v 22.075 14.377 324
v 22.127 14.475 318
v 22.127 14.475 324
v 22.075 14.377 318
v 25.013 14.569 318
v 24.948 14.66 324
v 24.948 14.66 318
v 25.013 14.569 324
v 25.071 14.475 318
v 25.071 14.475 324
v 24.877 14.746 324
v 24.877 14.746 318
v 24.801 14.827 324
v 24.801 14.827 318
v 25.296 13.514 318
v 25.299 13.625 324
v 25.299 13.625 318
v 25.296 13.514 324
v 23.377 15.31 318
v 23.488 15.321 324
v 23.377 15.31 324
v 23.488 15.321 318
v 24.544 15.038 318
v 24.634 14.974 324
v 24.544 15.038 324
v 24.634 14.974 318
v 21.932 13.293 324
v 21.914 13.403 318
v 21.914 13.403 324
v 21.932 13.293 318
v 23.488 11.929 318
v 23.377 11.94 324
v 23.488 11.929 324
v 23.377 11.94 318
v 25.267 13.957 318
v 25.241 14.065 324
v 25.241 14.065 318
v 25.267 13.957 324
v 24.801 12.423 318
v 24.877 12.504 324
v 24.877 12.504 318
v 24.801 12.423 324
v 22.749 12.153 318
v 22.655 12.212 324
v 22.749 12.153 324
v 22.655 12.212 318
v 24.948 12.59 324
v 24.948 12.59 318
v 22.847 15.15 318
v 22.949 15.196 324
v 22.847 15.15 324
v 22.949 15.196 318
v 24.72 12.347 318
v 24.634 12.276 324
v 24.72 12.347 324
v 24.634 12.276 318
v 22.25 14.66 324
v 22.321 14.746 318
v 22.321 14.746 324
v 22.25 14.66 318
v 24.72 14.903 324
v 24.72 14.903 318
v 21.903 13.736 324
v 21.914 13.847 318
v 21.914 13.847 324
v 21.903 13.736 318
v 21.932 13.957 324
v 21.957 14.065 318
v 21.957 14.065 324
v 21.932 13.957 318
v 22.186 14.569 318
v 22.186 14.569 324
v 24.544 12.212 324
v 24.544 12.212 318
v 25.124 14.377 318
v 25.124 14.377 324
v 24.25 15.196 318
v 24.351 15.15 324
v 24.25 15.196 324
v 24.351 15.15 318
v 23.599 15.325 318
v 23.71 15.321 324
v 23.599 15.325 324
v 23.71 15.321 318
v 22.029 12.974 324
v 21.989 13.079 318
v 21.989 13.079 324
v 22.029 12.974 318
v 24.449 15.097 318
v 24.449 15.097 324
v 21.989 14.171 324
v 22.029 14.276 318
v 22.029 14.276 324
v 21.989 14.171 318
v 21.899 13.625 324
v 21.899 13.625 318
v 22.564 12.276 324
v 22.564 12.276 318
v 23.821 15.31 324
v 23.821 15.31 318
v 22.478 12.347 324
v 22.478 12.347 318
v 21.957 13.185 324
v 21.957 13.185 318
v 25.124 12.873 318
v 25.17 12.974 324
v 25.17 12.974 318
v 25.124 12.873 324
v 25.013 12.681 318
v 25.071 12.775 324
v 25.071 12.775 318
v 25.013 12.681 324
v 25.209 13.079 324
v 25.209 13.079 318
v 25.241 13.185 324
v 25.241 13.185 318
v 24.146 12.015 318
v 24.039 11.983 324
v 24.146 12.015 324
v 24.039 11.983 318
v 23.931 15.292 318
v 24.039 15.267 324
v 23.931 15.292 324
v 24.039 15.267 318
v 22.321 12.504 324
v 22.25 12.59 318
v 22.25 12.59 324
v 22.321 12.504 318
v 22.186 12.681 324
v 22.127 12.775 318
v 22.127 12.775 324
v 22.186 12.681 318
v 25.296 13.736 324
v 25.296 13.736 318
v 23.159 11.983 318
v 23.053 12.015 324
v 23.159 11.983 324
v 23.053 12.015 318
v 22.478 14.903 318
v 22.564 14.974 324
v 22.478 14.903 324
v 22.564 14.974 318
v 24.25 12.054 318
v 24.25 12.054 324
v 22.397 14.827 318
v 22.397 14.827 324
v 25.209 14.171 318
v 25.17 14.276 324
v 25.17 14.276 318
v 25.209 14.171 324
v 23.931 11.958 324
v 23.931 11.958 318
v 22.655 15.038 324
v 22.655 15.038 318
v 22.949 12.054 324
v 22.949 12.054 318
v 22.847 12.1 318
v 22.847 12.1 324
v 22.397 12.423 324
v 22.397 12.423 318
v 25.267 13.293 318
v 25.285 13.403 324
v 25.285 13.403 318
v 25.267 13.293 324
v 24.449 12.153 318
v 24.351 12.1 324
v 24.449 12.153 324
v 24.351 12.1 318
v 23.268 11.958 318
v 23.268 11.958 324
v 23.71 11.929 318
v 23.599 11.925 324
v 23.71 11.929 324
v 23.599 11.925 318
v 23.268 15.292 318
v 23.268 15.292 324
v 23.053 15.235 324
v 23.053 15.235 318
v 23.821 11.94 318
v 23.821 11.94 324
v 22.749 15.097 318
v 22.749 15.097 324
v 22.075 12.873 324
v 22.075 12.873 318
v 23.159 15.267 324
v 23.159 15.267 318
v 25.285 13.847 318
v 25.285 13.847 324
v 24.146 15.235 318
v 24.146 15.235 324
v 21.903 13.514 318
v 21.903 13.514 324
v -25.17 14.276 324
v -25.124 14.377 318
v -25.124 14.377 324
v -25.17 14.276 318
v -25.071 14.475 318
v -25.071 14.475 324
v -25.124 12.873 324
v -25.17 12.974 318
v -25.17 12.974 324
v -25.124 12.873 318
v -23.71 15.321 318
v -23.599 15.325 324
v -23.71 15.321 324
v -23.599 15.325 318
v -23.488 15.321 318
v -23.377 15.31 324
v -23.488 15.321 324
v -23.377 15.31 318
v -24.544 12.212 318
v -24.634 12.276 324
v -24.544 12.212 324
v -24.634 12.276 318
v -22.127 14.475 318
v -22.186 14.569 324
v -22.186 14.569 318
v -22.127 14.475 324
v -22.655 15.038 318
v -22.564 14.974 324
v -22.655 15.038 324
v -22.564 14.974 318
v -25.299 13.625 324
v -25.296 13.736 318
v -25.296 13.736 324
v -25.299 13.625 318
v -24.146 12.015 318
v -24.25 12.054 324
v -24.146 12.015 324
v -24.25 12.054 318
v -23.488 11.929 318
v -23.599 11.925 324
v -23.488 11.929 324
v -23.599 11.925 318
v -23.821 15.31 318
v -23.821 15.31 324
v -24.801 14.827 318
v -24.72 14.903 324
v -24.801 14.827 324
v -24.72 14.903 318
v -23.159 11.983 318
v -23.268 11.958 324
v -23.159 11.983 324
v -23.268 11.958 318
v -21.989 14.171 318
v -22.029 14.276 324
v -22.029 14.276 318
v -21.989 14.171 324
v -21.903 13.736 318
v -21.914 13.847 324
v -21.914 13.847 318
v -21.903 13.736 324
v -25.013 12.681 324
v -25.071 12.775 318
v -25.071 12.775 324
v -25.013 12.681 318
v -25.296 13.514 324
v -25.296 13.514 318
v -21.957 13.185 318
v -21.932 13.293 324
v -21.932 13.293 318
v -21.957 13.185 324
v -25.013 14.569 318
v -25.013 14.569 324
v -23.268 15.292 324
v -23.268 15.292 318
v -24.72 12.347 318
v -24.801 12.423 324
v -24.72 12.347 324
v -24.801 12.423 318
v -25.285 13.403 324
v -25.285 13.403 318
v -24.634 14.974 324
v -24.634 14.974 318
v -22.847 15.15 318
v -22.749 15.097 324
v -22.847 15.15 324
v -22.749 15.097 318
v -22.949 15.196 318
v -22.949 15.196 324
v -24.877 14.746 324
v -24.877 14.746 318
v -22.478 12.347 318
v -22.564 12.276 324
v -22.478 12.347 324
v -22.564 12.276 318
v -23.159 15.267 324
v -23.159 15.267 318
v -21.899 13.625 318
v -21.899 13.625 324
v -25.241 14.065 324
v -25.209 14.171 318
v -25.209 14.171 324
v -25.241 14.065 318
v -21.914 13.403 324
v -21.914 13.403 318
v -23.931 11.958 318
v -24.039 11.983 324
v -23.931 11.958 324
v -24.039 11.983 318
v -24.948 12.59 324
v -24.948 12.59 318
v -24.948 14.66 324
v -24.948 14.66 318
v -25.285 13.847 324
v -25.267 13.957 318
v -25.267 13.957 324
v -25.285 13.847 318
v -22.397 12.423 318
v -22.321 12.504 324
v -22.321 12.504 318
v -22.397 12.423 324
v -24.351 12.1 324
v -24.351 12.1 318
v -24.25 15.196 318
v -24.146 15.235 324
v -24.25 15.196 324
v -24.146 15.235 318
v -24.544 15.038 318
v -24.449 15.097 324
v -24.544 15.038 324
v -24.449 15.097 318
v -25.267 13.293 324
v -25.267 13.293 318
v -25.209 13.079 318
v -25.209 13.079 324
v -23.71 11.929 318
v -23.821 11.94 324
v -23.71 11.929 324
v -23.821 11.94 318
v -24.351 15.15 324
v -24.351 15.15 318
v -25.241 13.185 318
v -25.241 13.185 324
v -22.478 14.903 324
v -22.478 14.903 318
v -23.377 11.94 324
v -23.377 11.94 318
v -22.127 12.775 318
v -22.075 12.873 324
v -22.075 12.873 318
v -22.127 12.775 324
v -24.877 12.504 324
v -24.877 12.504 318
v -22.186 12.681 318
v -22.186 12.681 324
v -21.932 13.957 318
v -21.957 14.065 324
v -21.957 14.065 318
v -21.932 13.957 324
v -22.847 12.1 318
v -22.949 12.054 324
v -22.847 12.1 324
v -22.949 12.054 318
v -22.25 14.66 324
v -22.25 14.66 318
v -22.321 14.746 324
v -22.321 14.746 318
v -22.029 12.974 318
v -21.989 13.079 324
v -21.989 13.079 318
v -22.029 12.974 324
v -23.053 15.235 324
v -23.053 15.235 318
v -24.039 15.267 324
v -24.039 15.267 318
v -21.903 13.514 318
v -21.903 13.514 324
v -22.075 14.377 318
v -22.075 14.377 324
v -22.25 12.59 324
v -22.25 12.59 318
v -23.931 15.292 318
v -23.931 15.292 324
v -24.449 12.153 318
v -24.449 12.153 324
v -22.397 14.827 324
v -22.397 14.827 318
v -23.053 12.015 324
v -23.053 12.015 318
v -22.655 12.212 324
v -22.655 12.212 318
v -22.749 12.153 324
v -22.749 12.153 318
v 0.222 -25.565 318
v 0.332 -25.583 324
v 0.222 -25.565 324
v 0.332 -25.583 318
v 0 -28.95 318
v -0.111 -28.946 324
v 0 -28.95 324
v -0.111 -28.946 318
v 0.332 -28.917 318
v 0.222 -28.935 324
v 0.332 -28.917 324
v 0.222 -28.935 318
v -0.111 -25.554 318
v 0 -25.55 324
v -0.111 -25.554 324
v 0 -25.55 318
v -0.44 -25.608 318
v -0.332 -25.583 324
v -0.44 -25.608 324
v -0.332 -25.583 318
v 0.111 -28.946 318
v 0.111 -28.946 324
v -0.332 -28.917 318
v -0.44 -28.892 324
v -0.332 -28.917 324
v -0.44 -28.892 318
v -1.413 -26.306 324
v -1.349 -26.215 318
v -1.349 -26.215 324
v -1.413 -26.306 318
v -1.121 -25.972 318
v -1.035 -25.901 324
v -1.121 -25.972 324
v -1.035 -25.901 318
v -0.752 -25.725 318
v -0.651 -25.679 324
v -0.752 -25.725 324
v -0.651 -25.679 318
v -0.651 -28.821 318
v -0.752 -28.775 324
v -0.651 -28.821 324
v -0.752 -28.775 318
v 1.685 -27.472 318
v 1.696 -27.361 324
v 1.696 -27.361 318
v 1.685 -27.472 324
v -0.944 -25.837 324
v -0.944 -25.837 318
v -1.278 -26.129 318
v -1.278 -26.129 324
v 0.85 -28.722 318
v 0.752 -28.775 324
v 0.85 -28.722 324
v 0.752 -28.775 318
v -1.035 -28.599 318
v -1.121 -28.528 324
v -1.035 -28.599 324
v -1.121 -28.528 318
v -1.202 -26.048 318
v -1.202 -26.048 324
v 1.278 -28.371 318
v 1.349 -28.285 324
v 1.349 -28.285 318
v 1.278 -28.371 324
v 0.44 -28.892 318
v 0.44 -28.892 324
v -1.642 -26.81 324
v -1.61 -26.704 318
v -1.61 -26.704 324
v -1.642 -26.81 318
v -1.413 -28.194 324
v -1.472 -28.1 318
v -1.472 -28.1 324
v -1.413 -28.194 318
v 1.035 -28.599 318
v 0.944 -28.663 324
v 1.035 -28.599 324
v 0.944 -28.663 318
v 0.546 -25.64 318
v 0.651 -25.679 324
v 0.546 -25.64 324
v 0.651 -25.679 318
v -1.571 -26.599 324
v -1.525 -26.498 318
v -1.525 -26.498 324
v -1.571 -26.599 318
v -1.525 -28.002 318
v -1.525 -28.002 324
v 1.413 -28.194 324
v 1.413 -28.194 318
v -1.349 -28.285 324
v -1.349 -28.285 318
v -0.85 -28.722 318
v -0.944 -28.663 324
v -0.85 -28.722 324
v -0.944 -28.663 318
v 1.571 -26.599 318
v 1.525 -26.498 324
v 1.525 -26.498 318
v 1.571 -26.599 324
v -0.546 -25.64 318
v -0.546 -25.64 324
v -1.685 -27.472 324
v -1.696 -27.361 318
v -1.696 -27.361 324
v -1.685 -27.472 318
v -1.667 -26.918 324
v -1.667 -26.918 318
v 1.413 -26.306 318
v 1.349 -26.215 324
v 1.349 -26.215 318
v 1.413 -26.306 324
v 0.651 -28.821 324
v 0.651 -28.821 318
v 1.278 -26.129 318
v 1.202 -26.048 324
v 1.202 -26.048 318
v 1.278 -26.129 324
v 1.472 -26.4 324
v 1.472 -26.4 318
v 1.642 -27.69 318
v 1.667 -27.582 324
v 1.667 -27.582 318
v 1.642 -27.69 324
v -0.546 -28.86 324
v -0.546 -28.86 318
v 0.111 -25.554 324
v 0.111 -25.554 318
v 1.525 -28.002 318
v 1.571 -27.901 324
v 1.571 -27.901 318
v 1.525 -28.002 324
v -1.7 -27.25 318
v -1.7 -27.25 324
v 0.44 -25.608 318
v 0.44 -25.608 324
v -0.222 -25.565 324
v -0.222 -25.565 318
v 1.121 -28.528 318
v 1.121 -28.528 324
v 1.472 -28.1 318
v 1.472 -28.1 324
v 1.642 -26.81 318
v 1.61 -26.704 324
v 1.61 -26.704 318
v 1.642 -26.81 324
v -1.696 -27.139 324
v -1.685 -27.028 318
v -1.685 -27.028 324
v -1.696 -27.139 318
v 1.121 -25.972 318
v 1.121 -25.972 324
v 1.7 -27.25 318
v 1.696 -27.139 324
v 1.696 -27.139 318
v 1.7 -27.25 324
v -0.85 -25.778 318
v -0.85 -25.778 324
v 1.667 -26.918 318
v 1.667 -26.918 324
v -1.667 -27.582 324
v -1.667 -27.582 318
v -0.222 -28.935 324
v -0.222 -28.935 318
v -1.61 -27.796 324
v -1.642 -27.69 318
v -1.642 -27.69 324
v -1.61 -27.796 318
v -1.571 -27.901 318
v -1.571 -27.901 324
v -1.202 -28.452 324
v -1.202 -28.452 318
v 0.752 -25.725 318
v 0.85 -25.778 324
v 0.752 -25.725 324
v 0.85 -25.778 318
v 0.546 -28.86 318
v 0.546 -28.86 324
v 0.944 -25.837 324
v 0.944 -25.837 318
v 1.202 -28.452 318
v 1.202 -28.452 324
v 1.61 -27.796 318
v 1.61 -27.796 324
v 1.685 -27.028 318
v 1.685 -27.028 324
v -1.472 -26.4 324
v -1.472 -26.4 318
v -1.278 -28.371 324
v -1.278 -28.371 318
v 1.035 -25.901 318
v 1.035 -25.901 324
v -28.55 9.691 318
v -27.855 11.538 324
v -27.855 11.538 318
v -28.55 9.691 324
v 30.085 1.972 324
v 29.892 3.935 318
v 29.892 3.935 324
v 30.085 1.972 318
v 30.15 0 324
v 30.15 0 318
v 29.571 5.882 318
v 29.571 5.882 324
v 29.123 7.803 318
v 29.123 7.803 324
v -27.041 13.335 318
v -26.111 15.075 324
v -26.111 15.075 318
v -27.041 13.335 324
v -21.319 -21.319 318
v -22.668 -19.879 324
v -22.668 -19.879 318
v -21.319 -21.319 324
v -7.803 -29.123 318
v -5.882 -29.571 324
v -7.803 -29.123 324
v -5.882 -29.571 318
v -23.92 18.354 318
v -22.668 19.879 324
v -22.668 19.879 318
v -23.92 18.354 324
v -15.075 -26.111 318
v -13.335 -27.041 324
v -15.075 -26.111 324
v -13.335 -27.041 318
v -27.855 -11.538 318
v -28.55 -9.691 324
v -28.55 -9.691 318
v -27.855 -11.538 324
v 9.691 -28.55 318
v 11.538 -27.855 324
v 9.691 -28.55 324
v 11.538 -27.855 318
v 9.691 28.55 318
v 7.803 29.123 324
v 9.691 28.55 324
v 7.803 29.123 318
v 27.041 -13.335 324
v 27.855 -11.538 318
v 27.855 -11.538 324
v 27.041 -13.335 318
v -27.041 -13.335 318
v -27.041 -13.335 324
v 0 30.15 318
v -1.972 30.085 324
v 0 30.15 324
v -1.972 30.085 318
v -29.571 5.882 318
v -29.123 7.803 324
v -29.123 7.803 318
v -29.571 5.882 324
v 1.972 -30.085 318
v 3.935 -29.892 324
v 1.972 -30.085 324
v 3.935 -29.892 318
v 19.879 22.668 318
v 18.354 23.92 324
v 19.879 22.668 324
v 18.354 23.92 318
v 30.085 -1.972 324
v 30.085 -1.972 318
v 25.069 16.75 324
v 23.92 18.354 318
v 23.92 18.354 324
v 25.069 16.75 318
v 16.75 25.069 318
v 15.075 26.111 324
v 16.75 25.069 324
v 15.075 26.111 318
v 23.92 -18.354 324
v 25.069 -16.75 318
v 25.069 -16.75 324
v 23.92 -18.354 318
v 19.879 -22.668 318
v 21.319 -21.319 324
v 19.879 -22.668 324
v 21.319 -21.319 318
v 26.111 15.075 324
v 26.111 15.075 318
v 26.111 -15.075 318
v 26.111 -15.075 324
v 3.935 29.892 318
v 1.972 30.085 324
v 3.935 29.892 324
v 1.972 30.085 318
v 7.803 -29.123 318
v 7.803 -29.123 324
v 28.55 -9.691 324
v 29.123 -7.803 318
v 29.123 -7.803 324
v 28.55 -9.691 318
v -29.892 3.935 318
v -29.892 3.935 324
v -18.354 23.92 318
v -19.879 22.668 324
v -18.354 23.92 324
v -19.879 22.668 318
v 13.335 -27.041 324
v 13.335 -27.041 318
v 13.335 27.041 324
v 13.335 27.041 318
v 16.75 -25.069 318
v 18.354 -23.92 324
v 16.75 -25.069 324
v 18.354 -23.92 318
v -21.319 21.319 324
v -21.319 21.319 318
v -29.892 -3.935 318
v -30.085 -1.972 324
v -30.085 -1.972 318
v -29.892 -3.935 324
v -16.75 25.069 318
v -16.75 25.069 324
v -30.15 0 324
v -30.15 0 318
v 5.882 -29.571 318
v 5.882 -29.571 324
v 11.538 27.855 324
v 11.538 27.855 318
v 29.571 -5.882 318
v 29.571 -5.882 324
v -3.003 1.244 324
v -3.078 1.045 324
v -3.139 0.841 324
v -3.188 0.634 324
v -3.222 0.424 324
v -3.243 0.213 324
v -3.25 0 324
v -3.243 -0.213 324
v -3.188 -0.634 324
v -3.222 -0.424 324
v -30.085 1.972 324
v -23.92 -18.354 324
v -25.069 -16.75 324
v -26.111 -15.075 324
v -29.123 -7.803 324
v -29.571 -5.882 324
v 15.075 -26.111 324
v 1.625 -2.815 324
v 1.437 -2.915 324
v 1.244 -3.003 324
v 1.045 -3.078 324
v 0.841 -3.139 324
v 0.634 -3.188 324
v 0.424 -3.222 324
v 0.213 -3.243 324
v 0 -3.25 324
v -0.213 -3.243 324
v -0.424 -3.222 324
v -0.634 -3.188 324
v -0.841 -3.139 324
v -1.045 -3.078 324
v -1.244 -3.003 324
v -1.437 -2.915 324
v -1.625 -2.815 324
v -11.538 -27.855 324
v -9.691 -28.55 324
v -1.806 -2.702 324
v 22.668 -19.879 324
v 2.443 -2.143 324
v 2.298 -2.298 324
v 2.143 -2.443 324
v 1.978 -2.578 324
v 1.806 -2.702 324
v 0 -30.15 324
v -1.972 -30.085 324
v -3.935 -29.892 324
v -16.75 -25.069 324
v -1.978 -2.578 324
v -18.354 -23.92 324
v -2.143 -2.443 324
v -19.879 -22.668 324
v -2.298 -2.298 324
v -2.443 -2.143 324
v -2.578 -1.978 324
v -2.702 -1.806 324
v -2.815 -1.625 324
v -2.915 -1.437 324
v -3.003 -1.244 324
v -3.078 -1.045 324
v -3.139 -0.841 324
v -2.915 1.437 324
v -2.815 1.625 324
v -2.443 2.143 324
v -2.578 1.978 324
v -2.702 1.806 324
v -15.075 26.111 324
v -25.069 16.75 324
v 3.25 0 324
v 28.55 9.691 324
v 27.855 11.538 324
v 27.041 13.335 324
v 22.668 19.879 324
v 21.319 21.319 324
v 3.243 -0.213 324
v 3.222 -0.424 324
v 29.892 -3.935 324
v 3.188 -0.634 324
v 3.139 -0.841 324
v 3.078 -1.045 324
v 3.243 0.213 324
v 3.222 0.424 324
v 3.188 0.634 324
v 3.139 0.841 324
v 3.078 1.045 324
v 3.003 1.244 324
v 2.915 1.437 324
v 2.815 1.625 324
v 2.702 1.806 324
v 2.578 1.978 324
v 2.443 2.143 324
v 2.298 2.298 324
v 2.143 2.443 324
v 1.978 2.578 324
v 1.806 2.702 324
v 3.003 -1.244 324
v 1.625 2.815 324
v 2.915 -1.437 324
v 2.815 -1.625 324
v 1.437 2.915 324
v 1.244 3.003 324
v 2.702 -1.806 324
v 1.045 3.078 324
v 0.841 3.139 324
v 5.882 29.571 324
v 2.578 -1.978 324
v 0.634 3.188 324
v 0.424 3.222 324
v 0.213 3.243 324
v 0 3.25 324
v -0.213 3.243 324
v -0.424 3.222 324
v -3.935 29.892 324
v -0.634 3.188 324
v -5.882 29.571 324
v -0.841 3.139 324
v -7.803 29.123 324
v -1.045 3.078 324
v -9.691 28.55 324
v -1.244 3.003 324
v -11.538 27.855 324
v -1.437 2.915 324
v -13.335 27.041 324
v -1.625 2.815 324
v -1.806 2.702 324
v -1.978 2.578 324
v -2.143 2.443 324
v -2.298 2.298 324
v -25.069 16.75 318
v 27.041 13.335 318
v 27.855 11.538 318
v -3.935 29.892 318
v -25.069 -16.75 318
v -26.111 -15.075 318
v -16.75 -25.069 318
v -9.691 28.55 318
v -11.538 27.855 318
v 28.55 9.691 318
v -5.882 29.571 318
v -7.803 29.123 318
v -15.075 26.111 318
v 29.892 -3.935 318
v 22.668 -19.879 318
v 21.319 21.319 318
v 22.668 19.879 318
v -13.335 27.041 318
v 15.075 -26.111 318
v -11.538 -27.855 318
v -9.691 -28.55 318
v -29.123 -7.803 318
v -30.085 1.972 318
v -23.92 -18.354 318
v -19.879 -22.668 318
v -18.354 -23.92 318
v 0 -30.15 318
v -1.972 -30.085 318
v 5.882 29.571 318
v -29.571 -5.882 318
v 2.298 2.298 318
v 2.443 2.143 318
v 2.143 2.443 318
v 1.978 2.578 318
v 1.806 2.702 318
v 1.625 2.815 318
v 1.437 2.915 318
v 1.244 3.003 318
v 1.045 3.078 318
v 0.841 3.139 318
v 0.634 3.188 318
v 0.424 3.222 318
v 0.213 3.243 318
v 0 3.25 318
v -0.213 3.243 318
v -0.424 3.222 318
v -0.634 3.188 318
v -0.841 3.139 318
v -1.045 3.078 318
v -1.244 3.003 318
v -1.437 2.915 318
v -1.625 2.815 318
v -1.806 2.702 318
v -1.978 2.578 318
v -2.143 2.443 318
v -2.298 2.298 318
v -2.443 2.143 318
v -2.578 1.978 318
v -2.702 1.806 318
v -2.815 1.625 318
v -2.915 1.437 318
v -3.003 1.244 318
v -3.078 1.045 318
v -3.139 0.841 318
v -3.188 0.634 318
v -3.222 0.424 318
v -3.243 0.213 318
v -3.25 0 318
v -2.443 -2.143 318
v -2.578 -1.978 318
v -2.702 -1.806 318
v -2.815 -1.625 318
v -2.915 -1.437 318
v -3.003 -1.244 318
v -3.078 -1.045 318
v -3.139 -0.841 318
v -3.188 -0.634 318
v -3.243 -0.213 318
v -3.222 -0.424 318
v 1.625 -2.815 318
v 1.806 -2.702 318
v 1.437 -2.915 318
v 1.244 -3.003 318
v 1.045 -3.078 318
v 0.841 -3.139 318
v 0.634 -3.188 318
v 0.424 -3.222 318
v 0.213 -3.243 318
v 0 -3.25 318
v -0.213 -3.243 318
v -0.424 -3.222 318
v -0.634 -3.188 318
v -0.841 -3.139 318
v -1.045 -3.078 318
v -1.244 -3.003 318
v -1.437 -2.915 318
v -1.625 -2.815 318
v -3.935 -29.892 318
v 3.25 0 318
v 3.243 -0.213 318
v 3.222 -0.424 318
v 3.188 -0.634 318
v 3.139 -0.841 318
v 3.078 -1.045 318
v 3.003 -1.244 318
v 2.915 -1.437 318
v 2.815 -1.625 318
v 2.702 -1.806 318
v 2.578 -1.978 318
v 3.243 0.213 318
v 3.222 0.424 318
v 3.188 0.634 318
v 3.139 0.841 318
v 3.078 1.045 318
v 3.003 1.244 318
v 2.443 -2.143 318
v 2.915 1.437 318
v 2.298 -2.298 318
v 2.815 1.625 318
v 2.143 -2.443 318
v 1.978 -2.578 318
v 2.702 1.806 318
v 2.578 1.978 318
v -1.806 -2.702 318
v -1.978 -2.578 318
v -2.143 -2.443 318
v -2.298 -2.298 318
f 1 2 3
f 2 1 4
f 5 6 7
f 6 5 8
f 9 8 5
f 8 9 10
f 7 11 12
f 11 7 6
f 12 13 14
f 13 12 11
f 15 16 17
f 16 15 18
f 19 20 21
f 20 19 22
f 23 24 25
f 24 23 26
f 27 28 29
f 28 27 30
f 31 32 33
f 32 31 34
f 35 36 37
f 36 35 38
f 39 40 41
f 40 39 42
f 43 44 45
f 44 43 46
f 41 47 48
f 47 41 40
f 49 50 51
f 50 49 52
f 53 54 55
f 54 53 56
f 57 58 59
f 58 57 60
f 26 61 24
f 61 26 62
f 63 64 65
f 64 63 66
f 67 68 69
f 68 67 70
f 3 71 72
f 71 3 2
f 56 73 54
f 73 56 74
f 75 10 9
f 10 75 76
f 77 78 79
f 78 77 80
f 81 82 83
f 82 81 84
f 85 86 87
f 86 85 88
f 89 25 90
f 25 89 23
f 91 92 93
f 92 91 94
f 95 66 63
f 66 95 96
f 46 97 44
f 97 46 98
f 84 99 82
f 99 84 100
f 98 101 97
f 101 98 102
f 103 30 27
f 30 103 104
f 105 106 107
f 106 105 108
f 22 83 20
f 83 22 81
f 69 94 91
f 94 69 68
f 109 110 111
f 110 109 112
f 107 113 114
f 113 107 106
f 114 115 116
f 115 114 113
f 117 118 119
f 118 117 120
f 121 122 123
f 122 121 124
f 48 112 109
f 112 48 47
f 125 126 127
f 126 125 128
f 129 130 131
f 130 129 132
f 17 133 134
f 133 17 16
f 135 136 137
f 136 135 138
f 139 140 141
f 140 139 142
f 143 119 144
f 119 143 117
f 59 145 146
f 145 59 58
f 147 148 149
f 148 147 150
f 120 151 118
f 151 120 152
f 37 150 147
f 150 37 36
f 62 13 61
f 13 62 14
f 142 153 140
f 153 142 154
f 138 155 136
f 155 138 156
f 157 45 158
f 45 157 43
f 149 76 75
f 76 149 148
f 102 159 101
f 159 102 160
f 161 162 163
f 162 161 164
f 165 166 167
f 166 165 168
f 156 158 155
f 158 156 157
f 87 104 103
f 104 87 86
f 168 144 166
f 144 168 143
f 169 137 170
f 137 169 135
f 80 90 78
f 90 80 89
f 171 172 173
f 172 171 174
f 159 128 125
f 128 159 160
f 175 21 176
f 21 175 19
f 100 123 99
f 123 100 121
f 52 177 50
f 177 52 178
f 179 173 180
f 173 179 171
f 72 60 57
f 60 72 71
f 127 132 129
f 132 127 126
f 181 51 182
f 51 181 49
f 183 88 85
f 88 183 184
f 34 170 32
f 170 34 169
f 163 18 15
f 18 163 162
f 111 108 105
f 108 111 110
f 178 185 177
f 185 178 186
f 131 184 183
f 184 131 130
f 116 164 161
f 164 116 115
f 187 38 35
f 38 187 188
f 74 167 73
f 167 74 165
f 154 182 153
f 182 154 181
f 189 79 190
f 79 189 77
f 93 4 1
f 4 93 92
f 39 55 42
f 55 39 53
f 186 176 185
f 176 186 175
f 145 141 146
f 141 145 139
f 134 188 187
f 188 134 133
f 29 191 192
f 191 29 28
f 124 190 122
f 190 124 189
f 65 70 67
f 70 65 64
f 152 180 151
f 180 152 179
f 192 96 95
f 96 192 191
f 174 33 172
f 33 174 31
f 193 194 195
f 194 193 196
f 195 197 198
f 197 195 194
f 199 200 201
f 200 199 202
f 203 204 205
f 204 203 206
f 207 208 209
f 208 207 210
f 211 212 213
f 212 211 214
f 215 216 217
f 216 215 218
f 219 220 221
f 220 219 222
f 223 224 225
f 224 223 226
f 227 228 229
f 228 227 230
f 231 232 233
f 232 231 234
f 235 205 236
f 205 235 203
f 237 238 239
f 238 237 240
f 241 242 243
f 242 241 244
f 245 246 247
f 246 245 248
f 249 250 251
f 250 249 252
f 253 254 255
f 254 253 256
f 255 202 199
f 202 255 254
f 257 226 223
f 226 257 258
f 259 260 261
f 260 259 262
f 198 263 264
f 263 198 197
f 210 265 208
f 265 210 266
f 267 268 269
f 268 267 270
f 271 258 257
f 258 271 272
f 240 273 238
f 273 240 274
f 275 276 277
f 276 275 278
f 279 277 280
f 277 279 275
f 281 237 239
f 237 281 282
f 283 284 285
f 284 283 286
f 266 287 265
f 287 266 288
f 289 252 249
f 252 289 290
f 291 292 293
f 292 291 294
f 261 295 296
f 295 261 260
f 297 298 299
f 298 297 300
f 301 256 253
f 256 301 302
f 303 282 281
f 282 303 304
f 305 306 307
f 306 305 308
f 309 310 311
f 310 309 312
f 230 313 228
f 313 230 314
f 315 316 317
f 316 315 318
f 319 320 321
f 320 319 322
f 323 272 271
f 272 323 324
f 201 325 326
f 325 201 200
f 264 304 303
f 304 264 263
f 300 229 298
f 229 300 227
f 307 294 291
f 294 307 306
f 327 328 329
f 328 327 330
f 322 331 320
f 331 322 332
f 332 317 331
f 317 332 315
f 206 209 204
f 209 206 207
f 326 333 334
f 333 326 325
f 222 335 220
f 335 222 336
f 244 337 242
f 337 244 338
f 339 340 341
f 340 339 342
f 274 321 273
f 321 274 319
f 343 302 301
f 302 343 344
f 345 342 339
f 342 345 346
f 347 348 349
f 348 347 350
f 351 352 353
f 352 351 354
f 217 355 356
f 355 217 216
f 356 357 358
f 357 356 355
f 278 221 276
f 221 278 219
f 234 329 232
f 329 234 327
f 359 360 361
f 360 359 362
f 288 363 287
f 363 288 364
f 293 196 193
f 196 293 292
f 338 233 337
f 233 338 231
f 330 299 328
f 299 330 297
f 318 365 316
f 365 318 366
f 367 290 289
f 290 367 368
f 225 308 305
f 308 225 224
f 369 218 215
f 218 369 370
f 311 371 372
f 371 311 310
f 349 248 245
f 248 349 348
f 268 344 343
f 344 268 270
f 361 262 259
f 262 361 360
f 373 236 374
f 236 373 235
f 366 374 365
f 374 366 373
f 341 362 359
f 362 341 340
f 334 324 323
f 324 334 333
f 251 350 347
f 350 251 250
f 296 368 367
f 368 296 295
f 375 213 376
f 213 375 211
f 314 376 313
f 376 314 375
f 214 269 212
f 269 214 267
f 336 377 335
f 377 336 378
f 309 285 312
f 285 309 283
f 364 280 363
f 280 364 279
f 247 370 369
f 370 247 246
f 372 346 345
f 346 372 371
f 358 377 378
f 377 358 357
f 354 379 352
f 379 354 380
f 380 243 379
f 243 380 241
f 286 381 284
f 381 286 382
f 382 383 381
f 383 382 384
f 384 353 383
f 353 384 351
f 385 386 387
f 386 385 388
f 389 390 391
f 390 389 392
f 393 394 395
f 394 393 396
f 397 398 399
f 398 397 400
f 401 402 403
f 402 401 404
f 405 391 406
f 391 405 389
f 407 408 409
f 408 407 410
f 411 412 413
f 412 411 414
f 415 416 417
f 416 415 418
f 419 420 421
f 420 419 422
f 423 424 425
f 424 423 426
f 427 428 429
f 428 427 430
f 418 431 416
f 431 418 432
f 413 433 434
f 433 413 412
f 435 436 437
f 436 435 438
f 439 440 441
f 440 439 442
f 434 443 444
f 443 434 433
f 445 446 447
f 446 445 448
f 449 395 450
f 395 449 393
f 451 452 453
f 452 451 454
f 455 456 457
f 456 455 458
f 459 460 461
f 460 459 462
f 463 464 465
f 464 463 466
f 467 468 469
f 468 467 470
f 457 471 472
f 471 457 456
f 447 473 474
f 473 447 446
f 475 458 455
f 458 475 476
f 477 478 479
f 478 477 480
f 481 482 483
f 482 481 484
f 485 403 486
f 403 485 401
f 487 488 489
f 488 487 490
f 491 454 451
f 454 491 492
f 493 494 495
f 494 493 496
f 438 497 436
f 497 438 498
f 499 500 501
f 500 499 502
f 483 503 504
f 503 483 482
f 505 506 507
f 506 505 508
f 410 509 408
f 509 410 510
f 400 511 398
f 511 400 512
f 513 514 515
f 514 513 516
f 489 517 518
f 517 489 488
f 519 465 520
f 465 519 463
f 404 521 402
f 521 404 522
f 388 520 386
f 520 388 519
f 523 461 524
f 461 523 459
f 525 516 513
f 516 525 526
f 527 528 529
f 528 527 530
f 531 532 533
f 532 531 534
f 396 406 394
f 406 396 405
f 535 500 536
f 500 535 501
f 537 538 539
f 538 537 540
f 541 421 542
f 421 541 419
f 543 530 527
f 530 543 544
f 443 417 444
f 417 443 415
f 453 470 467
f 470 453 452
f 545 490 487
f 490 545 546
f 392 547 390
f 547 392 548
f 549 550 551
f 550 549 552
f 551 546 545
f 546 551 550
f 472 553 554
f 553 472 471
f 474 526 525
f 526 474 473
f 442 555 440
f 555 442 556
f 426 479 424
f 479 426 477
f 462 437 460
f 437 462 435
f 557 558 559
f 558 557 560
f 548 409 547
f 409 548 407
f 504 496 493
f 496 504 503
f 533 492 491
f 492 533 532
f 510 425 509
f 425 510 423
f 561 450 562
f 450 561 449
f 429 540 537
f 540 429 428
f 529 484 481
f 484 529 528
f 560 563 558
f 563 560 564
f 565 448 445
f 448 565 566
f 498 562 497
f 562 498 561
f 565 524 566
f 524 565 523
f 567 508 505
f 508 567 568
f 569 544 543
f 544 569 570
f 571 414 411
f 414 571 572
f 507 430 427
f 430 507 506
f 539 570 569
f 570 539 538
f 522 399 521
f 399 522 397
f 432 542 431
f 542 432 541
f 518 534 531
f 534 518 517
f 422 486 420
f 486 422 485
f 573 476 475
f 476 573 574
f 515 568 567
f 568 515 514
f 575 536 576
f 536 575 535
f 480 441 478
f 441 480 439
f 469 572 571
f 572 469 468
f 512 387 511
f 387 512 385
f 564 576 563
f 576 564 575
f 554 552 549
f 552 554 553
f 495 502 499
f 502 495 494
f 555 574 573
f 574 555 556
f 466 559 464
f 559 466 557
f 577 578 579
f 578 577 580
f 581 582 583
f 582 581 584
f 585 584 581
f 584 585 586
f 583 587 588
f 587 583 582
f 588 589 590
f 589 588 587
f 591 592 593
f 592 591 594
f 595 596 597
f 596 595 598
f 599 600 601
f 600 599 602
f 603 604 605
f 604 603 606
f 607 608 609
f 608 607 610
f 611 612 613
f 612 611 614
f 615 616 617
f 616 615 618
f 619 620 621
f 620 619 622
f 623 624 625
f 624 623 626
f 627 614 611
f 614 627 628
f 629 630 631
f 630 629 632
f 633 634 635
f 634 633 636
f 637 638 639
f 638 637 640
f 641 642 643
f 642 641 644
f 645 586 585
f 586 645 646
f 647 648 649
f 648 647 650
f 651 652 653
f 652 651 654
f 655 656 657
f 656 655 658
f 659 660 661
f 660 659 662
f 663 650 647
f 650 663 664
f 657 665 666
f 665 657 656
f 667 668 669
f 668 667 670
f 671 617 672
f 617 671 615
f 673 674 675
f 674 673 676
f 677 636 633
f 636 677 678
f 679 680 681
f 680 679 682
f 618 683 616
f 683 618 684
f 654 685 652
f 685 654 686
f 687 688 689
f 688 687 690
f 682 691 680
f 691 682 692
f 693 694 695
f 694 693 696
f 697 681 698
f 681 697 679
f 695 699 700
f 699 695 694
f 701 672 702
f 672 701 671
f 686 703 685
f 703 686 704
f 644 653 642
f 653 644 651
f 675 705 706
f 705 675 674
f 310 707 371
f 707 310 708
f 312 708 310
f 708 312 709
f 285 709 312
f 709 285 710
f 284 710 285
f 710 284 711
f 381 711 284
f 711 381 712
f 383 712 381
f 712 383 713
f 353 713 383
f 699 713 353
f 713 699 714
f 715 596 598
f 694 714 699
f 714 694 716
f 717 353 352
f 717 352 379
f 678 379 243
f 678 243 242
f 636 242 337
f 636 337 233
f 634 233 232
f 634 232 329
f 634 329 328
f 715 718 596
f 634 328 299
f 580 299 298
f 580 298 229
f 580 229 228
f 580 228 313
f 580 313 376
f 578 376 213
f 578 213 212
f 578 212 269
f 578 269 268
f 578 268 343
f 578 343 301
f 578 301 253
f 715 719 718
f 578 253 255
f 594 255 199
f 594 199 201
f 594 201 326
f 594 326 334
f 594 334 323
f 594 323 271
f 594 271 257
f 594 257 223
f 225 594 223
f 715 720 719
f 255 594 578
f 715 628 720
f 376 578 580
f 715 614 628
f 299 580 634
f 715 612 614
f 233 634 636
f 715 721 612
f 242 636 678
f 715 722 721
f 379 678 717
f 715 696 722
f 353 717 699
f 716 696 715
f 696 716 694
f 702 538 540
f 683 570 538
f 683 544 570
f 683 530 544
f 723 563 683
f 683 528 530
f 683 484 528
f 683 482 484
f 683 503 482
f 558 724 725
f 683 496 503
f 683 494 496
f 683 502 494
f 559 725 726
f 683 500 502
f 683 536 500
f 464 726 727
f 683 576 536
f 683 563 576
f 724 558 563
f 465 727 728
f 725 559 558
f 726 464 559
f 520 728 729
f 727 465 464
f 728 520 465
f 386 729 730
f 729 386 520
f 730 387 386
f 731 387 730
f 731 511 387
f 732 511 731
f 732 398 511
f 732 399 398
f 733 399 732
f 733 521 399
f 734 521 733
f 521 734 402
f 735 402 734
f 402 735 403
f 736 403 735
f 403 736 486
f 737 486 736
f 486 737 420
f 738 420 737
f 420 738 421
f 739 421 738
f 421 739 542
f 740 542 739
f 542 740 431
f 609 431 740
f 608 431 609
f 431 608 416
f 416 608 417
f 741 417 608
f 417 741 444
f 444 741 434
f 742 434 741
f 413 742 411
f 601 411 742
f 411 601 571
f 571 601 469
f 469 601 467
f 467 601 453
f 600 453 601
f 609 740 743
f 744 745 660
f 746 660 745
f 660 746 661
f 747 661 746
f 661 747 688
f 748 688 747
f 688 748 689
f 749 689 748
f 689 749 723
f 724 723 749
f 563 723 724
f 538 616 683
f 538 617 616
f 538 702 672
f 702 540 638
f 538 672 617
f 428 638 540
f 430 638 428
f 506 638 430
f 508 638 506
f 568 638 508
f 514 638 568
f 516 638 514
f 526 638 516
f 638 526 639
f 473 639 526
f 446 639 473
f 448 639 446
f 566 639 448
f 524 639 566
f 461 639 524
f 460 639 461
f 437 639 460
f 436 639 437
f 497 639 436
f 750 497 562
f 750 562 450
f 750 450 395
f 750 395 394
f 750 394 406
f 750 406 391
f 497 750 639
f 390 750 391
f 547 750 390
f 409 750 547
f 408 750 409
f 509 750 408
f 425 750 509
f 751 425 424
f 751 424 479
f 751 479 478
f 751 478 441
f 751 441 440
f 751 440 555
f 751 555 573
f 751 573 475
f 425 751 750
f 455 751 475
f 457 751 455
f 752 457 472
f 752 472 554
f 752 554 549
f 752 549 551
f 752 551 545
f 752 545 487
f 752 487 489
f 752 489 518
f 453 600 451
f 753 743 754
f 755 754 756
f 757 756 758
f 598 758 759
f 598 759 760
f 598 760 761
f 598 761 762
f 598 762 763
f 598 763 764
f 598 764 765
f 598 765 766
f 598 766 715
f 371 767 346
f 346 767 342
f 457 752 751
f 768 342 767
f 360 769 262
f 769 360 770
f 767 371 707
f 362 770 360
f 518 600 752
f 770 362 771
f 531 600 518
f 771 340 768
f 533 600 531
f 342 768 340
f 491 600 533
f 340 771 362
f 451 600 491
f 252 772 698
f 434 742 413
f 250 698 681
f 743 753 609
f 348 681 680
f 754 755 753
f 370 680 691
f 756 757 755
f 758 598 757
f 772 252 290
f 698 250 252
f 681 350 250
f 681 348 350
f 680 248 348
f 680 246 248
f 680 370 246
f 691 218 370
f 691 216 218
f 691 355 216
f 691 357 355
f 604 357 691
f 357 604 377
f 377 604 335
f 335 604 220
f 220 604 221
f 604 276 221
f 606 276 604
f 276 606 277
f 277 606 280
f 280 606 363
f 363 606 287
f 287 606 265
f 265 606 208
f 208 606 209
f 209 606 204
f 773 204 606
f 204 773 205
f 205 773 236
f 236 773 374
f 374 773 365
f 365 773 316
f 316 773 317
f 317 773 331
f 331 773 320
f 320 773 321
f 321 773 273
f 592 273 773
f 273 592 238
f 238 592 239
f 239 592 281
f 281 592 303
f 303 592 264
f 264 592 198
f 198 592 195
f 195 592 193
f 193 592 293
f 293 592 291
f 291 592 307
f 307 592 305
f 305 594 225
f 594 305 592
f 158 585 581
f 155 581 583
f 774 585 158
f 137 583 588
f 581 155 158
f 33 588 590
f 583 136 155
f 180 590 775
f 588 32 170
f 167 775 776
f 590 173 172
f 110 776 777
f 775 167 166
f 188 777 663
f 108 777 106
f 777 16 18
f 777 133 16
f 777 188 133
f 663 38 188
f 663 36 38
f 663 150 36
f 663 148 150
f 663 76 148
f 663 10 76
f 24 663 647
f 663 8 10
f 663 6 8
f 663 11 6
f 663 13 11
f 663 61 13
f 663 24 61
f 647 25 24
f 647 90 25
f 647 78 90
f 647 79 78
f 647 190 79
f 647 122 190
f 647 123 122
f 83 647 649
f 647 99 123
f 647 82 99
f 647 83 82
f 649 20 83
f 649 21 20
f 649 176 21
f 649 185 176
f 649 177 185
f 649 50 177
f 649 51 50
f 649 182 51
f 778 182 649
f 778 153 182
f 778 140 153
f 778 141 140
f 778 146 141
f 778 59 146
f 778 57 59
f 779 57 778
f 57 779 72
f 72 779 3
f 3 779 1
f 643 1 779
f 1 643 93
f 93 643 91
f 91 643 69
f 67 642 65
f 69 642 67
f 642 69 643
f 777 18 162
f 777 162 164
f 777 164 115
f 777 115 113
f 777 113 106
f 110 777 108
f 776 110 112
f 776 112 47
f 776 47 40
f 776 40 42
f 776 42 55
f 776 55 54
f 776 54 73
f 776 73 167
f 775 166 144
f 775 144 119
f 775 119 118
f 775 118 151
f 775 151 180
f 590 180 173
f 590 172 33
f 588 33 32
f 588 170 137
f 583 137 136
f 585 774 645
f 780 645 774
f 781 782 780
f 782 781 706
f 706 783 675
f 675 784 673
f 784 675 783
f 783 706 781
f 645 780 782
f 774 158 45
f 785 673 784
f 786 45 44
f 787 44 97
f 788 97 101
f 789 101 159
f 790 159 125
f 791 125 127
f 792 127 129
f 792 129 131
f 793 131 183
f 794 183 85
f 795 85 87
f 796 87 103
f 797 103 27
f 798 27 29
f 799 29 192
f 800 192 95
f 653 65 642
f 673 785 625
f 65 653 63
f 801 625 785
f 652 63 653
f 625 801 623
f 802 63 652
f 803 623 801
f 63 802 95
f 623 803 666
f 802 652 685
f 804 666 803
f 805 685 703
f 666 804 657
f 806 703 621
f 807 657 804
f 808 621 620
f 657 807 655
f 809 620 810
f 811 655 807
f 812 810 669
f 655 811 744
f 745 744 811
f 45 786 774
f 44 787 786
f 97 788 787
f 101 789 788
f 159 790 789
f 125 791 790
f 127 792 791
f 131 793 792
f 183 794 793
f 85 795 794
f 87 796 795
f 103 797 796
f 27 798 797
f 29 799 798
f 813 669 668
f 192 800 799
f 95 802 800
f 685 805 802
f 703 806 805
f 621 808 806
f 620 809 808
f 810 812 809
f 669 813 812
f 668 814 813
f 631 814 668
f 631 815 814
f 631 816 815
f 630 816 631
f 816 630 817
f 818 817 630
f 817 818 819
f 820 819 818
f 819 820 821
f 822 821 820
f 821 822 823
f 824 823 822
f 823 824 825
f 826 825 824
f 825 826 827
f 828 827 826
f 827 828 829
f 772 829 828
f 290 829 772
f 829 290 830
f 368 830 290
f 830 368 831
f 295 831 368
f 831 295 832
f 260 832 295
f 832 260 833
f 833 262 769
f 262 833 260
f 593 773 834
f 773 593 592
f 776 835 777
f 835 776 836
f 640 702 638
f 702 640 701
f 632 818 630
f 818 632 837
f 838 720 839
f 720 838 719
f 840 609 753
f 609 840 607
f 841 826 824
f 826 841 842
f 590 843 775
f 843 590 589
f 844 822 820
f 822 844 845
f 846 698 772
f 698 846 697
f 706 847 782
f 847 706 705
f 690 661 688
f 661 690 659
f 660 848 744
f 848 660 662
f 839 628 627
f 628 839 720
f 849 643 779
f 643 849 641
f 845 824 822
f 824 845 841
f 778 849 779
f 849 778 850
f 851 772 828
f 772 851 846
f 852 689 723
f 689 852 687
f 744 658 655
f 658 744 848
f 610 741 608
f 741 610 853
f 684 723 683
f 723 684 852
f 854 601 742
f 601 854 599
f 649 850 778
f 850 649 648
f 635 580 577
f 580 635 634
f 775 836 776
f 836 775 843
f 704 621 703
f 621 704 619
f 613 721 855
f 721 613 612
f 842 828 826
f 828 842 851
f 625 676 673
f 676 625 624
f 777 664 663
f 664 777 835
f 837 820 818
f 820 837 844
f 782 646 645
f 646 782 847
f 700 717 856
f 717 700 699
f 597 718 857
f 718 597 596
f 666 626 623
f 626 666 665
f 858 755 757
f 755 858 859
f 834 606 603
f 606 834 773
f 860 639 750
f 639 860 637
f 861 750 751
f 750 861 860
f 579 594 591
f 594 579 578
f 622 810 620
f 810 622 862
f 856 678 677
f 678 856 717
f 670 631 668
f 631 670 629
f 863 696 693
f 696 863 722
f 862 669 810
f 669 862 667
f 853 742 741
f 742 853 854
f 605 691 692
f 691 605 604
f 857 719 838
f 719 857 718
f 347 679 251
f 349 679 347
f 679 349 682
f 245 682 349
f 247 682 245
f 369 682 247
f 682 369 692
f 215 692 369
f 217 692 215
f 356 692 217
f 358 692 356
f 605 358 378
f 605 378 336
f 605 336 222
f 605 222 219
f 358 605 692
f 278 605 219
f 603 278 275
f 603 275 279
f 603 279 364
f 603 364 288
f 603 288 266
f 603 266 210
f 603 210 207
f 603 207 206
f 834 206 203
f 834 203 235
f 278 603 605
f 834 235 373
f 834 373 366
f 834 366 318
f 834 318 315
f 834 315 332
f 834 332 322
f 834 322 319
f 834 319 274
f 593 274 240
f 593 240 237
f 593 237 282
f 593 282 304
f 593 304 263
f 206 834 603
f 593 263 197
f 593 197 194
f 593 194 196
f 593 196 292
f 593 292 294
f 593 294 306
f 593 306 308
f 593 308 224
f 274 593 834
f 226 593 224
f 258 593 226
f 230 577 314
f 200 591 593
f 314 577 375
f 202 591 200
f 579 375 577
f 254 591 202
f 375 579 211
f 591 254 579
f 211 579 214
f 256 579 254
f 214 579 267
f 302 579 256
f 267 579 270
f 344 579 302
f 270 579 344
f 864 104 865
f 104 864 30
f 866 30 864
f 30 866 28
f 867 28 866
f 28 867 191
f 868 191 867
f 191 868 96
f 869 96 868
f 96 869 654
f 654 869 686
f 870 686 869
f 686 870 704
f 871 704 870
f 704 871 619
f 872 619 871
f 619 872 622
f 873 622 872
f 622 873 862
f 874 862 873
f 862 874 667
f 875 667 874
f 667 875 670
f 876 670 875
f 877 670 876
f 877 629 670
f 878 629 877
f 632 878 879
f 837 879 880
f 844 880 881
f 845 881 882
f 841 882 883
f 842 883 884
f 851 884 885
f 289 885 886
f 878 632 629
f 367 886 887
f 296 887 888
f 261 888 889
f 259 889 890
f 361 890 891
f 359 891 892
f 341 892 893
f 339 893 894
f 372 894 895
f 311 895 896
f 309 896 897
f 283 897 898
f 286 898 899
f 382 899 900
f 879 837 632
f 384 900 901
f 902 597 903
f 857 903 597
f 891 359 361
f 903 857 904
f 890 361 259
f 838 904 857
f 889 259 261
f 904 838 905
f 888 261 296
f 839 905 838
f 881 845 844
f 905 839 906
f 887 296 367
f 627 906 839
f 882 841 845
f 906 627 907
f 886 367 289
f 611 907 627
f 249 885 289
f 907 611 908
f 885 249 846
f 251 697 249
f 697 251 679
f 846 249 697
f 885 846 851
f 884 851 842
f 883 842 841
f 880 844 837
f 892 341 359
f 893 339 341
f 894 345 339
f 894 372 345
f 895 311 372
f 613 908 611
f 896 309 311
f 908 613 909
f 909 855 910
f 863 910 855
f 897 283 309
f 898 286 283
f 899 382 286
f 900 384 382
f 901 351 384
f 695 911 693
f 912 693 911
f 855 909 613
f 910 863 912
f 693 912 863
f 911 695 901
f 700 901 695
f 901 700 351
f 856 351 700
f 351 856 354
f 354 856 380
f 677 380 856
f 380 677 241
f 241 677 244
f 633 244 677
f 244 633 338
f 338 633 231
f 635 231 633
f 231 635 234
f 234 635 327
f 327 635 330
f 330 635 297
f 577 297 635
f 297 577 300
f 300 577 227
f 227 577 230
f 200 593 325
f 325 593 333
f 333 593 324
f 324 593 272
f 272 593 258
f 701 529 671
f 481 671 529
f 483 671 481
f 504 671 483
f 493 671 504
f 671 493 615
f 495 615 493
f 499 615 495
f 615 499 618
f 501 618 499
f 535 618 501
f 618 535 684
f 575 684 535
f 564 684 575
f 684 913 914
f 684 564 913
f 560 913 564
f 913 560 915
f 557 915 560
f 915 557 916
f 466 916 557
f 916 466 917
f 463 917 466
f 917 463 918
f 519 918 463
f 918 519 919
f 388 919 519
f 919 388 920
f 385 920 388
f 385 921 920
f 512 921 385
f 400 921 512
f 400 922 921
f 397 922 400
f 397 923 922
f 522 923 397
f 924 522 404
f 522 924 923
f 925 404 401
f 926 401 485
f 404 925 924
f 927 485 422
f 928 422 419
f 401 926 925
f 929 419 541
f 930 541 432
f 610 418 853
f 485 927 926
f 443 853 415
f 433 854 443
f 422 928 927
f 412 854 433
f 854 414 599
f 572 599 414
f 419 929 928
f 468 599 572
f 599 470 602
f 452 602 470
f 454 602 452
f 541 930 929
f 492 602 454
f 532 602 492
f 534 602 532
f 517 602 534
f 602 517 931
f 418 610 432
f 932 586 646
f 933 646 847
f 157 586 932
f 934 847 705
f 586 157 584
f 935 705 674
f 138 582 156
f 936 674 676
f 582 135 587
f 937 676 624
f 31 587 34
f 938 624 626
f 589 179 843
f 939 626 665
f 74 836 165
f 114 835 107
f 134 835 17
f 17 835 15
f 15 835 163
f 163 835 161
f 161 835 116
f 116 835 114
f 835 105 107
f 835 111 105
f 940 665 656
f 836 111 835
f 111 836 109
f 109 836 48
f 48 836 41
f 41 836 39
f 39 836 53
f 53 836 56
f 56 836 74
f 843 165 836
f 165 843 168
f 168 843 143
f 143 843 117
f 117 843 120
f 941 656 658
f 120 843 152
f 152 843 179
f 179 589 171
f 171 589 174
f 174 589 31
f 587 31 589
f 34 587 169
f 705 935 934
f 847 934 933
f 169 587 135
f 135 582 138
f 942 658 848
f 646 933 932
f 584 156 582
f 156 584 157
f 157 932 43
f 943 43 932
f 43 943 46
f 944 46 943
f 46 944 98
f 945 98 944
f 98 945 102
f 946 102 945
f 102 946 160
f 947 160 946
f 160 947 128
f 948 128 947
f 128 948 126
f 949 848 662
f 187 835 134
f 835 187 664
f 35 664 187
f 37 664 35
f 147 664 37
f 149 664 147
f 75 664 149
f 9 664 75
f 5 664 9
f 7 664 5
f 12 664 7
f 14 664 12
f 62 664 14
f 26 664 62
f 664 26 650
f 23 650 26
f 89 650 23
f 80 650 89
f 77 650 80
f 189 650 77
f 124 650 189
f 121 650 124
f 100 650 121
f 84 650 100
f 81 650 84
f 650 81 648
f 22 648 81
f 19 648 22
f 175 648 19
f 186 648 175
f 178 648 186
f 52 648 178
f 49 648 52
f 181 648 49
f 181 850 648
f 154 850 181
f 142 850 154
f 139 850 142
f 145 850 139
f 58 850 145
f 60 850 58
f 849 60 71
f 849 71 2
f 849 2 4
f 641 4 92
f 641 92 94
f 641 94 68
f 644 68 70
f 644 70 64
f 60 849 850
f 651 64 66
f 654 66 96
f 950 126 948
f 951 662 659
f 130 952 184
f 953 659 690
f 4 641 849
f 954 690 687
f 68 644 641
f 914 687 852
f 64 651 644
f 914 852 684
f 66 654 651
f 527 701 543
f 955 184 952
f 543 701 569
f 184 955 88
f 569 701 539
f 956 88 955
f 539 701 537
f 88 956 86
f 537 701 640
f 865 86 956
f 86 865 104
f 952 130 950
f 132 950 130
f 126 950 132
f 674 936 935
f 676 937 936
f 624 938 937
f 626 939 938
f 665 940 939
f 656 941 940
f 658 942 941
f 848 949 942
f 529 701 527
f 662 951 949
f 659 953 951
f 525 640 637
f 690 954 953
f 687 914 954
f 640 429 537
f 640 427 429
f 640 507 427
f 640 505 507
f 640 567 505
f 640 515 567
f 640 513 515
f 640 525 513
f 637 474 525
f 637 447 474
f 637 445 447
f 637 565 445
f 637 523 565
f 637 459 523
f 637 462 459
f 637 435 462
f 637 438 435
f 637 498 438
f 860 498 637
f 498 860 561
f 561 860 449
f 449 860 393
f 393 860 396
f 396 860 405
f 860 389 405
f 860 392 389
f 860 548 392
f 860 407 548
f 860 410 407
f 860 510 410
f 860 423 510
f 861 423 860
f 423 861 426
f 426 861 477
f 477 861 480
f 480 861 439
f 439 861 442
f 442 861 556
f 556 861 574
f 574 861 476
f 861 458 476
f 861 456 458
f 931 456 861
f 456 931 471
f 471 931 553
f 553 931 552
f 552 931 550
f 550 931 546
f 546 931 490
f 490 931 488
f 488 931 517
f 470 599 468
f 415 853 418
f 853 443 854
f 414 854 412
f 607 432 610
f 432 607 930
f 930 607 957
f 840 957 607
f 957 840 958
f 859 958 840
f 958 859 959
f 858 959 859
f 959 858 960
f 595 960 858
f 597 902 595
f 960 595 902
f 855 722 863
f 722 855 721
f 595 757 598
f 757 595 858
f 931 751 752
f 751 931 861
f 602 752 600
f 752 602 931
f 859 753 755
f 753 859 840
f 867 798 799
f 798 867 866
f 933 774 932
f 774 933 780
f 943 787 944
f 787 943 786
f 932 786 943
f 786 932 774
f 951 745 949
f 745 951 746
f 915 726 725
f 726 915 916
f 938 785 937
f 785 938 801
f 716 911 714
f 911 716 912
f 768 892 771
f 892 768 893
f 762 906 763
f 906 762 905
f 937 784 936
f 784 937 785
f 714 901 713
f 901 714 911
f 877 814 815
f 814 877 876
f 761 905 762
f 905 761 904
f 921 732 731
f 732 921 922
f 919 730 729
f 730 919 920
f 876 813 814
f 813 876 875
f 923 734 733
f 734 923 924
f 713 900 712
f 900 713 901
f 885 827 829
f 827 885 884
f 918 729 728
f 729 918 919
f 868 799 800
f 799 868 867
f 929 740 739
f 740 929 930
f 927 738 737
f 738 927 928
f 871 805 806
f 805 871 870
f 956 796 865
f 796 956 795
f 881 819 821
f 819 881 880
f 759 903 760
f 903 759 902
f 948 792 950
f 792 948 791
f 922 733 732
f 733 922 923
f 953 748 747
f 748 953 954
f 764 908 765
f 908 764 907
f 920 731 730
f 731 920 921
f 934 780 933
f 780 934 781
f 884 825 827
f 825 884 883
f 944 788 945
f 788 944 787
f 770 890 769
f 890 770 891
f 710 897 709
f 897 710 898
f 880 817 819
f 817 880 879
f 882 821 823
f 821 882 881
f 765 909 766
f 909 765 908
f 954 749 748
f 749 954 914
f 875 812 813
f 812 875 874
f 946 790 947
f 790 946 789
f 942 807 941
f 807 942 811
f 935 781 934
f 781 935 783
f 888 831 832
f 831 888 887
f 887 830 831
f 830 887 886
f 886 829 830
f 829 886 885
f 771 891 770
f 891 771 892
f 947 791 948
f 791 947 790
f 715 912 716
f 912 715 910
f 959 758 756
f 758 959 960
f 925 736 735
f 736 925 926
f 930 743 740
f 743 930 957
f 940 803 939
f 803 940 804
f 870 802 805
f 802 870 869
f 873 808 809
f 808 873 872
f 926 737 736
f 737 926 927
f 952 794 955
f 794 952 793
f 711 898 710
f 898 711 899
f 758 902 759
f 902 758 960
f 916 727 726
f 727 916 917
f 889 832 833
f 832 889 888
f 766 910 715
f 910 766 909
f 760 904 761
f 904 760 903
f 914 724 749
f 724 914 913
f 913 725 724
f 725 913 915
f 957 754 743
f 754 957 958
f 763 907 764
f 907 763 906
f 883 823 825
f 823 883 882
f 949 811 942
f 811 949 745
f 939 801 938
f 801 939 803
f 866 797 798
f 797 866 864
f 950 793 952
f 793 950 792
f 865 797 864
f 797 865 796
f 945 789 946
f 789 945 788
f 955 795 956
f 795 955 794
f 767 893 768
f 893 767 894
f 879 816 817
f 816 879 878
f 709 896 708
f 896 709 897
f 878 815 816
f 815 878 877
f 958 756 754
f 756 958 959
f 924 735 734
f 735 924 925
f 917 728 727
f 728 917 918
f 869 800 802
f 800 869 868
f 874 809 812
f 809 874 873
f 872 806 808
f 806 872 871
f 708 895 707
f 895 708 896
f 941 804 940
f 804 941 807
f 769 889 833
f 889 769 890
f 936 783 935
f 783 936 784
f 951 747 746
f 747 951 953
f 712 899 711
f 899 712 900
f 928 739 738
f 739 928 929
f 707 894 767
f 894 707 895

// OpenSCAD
// file: ../lib/astra66_core.scad
// =============================================================================
// ASTRA-66 CAD rev B -- core library
// Parameters (generated from analysis.py by build.py), derived stations and helpers.
// Every part file includes this; stations mirror analysis.py X[] exactly.
//
// Frame: rocket axis = +Z, STA 0 = nose tip, stations increase aft.
// Angles: measured about +Z from +X toward +Y.  90 deg = switch / hatch side,
// 270 deg = camera side, 45 deg = rail-button line, fins at 0/90/180/270 deg.
// =============================================================================
include <../astra66_params.scad>

$fn = FN;
EPS = 0.01;
CAD_REV = "B";

// ----------------------------------------------------------------- radii
R_OD    = BODY_OD / 2;                 // body tube outer
R_ID    = BODY_ID / 2;                 // body tube inner
R_SH    = (BODY_ID - FIT_SH) / 2;      // printed shoulder / ring OD radius
R_SI    = R_SH - NC_SH_WALL;           // nose shoulder inner radius
R_CO    = CPL_OD / 2;                  // coupler outer
R_CI    = CPL_ID / 2;                  // coupler inner
R_BH_IN = (CPL_ID - 0.2) / 2;          // inner bulkhead disc (fits in coupler)
R_MO    = MMT_OD / 2;
R_MI    = MMT_ID / 2;
R_RING_BORE = (MMT_OD + FIT_SH) / 2;   // centering-ring / core bore
R_TAB_FLOOR = max(R_MO, RET_CLEAR_D / 2);          // rev B: tab clears the COTS retainer
FIN_TAB_H   = R_OD - R_TAB_FLOOR - FIN_TAB_CLR;

// ----------------------------------------------------------------- stations
X_NC_BASE     = NC_L;
X_SH_END      = NC_L + NC_SH_L;
X_PL_END      = NC_L + PL_L;
X_BAND_END    = X_PL_END + AV_BAND_L;
X_END         = X_BAND_END + BO_L;
L_OVERALL     = X_END;                              // airframe length (excl. COTS retainer)
X_CPL_FWD     = X_PL_END - AV_INS;
X_CPL_AFT     = X_BAND_END + AV_INS;
X_AVB_FWD_OUT = X_CPL_FWD - AV_BH_T;                // AV-303 forward face
X_AVB_AFT_OUT = X_CPL_AFT + GASKET_T;               // AV-304 outer-disc forward face
X_AVB_AFT_END = X_AVB_AFT_OUT + AV_BH_T;            // AV-304 aft face (recovery bay starts)
X_SLED_FWD    = X_CPL_FWD + AV_BH_T + SLED_FWD_GAP;
X_SLED_AFT    = X_SLED_FWD + SLED_L;
X_MMT_AFT     = X_END + MMT_AFT_EXT;
X_MMT_FWD     = X_MMT_AFT - MMT_L;
X_FIN_LE      = X_END - FIN_CR;
X_TAB_FWD     = X_FIN_LE + FIN_TAB_FWD;
X_TAB_AFT     = X_END - LOCK_T;
X_CORE_FWD    = X_TAB_FWD - CORE_RING_T;
X_CORE_AFT    = X_END - LOCK_T;
X_NC_SCREW    = NC_L + NC_SH_L / 2;
X_CAM         = X_SH_END + CAM_OFF;
X_HATCH       = X_SH_END + HATCH_OFF;
X_RB_FWD      = X_MMT_FWD - RB_FWD_OFF;
X_RB_AFT      = X_END - RB_AFT_OFF;
X_TRAY_FWD    = X_AVB_FWD_OUT - TRAY_L;
X_SW          = X_PL_END + AV_BAND_L / 2;
X_MOTOR_FWD   = X_MMT_AFT - MOTOR_L;
X_BAT0        = X_SLED_FWD + 2;
BAT_CAGE_L    = 12 + BAT_L + 0.6;
PAYLOAD_BAY_L  = X_AVB_FWD_OUT - X_SH_END;
RECOVERY_BAY_L = X_MMT_FWD - X_AVB_AFT_END;

FIN_ANGLES      = [for (i = [0 : FIN_N - 1]) i * 360 / FIN_N];
LOCK_SCREW_ANG  = [45, 135, 225, 315];
STATIC_PORT_ANG = [45, 135, 225, 315];

// ----------------------------------------------------------------- geometry helpers
function ogive_rho()  = (R_OD * R_OD + NC_L * NC_L) / (2 * R_OD);
function ogive_r(x)   = sqrt(max(pow(ogive_rho(), 2) - pow(NC_L - x, 2), 0)) + R_OD - ogive_rho();

// Solid of revolution of the tangent ogive between stations x0..x1, radially offset inward by off.
module ogive_solid(x0, x1, off = 0, n = 72) {
    s = (x0 == 0) ? 1 : 0;
    rotate_extrude()
        polygon(concat([[0, x0]],
                       [for (i = [s : n]) let(x = x0 + (x1 - x0) * i / n) [max(ogive_r(x) - off, 0.01), x]],
                       [[0, x1]]));
}

module tube_r(ro, ri, z0, z1) {
    translate([0, 0, z0]) difference() {
        cylinder(r = ro, h = z1 - z0);
        translate([0, 0, -1]) cylinder(r = ri, h = z1 - z0 + 2);
    }
}

module at_angle(a) { rotate([0, 0, a]) children(); }

// Cylinder of diameter d along the radial direction at angle a, from radius r0 to r1, at station z.
module radial_cyl(d, z, a, r0, r1) {
    at_angle(a) translate([r0, 0, z]) rotate([0, 90, 0]) cylinder(d = d, h = r1 - r0);
}

module rounded_rect(l, w, r) { offset(r = r) square([l - 2 * r, w - 2 * r], center = true); }

// Radial prism with a rounded-rectangle footprint (l axial x w tangential) centred at station z.
module radial_prism(a, z, l, w, rr, r0, r1) {
    at_angle(a) translate([r0, 0, z]) rotate([0, 90, 0]) linear_extrude(r1 - r0) rounded_rect(l, w, rr);
}

// Block in the radial frame at angle a: radial r0..r1, tangential +/-hw, stations z0..z1, clipped to radius rc.
module radial_block(a, r0, r1, hw, z0, z1, rc) {
    intersection() {
        at_angle(a) translate([r0, -hw, z0]) cube([r1 - r0, 2 * hw, z1 - z0]);
        translate([0, 0, z0 - 1]) cylinder(r = rc, h = z1 - z0 + 2);
    }
}

// Camera frame: child +Z = lens axis (outward, tilted CAM_TILT aft), origin at the lens face centre.
// Lens-face radius CAM_R0 is the smaller of (a) the tilted barrel rim 0.5 mm inside the bore and
// (b) the tilted camera-body corners 0.5 mm inside the bore -- so any CAM_W/CAM_LEN entered fits.
CAM_SETBACK = CAM_LENS_L * cos(CAM_TILT) + (CAM_LENS_HOLE - 1) / 2 * sin(CAM_TILT) + 0.5;
CAM_R0 = min(R_ID - CAM_SETBACK, sqrt(pow(R_ID - 0.5, 2) - pow(CAM_W / 2, 2)) - CAM_LEN / 2 * sin(CAM_TILT));
module cam_frame() {
    at_angle(CAM_ANG) translate([CAM_R0, 0, X_CAM]) rotate([0, 90 - CAM_TILT, 0]) children();
}

echo(str("ASTRA-66 CAD rev ", CAD_REV, ": L_OVERALL=", L_OVERALL, " payload bay=", PAYLOAD_BAY_L,
         " recovery bay=", RECOVERY_BAY_L, " fin tab depth=", FIN_TAB_H));
// main file
// ASTRA-66 CAD rev B -- NC-103 Nose bulkhead / ballast mount
// Disc inside the NC-102 shoulder, bolted to the 3 lugs (3x M3 x 10), centre hole for the NC-104 M6 rod.
// PETG, FDM, flat, 60 % gyroid.
include <../lib/astra66_core.scad>

module NC_103_nose_bulkhead() {
    translate([0, 0, X_SH_END - NC_BH_T]) difference() {
        cylinder(r = R_SI - 0.1, h = NC_BH_T);
        translate([0, 0, -1]) cylinder(d = CLR_M6, h = NC_BH_T + 2);
        for (a = NC_LUG_ANG) at_angle(a) translate([R_SI - NC_LUG_T / 2, 0, -1]) cylinder(d = CLR_M3, h = NC_BH_T + 2);
    }
}

NC_103_nose_bulkhead();
